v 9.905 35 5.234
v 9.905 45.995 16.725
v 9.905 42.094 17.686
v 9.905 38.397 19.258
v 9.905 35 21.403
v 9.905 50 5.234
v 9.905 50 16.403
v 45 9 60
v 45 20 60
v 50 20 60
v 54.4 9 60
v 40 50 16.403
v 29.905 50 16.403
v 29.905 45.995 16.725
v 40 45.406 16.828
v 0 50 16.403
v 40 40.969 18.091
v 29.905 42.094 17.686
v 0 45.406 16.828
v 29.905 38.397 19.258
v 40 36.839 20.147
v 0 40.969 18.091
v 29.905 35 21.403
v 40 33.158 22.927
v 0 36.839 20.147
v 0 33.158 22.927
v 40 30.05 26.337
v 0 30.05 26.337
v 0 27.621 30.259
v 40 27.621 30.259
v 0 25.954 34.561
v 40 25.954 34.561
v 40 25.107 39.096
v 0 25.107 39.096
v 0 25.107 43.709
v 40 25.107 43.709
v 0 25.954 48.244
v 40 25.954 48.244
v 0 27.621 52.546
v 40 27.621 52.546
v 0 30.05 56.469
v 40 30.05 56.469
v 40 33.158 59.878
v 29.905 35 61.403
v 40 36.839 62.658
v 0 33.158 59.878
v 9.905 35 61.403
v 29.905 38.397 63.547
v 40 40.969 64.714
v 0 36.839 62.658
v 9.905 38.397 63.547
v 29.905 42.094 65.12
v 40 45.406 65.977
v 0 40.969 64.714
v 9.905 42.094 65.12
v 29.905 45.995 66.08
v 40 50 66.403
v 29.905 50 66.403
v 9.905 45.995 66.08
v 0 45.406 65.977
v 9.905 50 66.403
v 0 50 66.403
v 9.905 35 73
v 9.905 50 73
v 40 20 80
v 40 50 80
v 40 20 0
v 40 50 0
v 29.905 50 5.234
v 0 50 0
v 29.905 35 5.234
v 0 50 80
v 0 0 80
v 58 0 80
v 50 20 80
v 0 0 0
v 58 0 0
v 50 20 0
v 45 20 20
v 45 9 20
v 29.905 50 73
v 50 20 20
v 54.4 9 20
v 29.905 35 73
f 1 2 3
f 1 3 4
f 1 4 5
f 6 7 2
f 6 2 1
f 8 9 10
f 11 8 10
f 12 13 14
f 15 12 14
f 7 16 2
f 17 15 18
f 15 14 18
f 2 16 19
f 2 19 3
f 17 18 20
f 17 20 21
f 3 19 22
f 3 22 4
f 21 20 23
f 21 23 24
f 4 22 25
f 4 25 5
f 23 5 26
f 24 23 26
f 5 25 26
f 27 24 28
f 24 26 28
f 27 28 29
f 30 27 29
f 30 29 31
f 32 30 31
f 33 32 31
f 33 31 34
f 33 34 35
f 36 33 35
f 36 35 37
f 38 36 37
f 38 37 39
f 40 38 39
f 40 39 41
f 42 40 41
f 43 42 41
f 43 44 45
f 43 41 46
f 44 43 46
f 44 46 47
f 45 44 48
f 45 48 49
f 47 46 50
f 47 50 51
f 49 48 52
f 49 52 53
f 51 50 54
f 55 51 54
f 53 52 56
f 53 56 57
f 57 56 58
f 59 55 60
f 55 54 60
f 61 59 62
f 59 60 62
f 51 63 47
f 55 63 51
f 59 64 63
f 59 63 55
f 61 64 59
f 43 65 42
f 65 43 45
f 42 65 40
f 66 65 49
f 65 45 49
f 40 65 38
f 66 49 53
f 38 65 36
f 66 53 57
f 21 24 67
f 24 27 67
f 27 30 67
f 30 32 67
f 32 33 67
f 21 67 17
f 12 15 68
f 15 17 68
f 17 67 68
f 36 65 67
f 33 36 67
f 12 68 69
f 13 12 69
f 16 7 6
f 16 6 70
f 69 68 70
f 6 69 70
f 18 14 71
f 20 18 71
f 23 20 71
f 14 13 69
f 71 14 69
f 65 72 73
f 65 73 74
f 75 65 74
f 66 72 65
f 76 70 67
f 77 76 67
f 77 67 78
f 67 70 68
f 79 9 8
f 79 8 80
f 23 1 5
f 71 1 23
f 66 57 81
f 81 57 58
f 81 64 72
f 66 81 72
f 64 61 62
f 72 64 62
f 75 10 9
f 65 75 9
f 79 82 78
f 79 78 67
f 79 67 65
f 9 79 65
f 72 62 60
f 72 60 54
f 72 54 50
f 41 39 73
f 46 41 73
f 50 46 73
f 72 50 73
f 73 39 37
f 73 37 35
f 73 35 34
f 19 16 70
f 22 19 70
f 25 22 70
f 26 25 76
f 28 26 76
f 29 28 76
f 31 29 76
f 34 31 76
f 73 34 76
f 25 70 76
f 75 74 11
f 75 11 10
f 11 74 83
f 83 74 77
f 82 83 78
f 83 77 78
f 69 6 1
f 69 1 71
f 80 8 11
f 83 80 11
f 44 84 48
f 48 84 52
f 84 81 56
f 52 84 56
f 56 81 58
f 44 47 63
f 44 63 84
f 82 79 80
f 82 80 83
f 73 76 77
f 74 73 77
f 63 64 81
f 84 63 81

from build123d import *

# Parameters (mm, degrees)
BOSS_EXTRUDE1_DEPTH = 80
CUT_EXTRUDE1_DEPTH  = 80
SKETCH3_W           = 20
SKETCH3_H           = 67.765549713
CUT_EXTRUDE2_DEPTH  = 15
SKETCH6_W           = 10
SKETCH6_H           = 40
CUT_EXTRUDE4_DEPTH  = 11


with BuildPart() as part:
    # Sketch1 → Boss-Extrude1 (new body)
    with BuildSketch(Plane.XY):
        Polygon((0, 50), (0, 0), (58, 0), (50, 20), (40, 20), (40, 50), align=None)
    extrude(amount=BOSS_EXTRUDE1_DEPTH)

    # Sketch2 → Cut-Extrude1 (cut)
    with BuildSketch(Plane.ZY):
        with BuildLine():
            Line((66.402636912, 50), (16.402636912, 50))
            ThreePointArc((16.402636912, 50), (41.402636912, 25), (66.402636912, 50))
        make_face()
    extrude(amount=-CUT_EXTRUDE1_DEPTH, mode=Mode.SUBTRACT)

    # Sketch3 → Cut-Extrude2 (cut)
    with BuildSketch(Plane(origin=(0, 50, 0), x_dir=(1, 0, 0), z_dir=(0, 1, 0))):
        with Locations((19.905264977, -39.117225144)):
            Rectangle(SKETCH3_W, SKETCH3_H)
    extrude(amount=-CUT_EXTRUDE2_DEPTH, mode=Mode.SUBTRACT)

    # Sketch6 → Cut-Extrude4 (cut)
    with BuildSketch(Plane(origin=(0, 20, 0), x_dir=(1, 0, 0), z_dir=(0, 1, 0))):
        with Locations((50, -40)):
            Rectangle(SKETCH6_W, SKETCH6_H)
    extrude(amount=-CUT_EXTRUDE4_DEPTH, mode=Mode.SUBTRACT)


solid = part.part
